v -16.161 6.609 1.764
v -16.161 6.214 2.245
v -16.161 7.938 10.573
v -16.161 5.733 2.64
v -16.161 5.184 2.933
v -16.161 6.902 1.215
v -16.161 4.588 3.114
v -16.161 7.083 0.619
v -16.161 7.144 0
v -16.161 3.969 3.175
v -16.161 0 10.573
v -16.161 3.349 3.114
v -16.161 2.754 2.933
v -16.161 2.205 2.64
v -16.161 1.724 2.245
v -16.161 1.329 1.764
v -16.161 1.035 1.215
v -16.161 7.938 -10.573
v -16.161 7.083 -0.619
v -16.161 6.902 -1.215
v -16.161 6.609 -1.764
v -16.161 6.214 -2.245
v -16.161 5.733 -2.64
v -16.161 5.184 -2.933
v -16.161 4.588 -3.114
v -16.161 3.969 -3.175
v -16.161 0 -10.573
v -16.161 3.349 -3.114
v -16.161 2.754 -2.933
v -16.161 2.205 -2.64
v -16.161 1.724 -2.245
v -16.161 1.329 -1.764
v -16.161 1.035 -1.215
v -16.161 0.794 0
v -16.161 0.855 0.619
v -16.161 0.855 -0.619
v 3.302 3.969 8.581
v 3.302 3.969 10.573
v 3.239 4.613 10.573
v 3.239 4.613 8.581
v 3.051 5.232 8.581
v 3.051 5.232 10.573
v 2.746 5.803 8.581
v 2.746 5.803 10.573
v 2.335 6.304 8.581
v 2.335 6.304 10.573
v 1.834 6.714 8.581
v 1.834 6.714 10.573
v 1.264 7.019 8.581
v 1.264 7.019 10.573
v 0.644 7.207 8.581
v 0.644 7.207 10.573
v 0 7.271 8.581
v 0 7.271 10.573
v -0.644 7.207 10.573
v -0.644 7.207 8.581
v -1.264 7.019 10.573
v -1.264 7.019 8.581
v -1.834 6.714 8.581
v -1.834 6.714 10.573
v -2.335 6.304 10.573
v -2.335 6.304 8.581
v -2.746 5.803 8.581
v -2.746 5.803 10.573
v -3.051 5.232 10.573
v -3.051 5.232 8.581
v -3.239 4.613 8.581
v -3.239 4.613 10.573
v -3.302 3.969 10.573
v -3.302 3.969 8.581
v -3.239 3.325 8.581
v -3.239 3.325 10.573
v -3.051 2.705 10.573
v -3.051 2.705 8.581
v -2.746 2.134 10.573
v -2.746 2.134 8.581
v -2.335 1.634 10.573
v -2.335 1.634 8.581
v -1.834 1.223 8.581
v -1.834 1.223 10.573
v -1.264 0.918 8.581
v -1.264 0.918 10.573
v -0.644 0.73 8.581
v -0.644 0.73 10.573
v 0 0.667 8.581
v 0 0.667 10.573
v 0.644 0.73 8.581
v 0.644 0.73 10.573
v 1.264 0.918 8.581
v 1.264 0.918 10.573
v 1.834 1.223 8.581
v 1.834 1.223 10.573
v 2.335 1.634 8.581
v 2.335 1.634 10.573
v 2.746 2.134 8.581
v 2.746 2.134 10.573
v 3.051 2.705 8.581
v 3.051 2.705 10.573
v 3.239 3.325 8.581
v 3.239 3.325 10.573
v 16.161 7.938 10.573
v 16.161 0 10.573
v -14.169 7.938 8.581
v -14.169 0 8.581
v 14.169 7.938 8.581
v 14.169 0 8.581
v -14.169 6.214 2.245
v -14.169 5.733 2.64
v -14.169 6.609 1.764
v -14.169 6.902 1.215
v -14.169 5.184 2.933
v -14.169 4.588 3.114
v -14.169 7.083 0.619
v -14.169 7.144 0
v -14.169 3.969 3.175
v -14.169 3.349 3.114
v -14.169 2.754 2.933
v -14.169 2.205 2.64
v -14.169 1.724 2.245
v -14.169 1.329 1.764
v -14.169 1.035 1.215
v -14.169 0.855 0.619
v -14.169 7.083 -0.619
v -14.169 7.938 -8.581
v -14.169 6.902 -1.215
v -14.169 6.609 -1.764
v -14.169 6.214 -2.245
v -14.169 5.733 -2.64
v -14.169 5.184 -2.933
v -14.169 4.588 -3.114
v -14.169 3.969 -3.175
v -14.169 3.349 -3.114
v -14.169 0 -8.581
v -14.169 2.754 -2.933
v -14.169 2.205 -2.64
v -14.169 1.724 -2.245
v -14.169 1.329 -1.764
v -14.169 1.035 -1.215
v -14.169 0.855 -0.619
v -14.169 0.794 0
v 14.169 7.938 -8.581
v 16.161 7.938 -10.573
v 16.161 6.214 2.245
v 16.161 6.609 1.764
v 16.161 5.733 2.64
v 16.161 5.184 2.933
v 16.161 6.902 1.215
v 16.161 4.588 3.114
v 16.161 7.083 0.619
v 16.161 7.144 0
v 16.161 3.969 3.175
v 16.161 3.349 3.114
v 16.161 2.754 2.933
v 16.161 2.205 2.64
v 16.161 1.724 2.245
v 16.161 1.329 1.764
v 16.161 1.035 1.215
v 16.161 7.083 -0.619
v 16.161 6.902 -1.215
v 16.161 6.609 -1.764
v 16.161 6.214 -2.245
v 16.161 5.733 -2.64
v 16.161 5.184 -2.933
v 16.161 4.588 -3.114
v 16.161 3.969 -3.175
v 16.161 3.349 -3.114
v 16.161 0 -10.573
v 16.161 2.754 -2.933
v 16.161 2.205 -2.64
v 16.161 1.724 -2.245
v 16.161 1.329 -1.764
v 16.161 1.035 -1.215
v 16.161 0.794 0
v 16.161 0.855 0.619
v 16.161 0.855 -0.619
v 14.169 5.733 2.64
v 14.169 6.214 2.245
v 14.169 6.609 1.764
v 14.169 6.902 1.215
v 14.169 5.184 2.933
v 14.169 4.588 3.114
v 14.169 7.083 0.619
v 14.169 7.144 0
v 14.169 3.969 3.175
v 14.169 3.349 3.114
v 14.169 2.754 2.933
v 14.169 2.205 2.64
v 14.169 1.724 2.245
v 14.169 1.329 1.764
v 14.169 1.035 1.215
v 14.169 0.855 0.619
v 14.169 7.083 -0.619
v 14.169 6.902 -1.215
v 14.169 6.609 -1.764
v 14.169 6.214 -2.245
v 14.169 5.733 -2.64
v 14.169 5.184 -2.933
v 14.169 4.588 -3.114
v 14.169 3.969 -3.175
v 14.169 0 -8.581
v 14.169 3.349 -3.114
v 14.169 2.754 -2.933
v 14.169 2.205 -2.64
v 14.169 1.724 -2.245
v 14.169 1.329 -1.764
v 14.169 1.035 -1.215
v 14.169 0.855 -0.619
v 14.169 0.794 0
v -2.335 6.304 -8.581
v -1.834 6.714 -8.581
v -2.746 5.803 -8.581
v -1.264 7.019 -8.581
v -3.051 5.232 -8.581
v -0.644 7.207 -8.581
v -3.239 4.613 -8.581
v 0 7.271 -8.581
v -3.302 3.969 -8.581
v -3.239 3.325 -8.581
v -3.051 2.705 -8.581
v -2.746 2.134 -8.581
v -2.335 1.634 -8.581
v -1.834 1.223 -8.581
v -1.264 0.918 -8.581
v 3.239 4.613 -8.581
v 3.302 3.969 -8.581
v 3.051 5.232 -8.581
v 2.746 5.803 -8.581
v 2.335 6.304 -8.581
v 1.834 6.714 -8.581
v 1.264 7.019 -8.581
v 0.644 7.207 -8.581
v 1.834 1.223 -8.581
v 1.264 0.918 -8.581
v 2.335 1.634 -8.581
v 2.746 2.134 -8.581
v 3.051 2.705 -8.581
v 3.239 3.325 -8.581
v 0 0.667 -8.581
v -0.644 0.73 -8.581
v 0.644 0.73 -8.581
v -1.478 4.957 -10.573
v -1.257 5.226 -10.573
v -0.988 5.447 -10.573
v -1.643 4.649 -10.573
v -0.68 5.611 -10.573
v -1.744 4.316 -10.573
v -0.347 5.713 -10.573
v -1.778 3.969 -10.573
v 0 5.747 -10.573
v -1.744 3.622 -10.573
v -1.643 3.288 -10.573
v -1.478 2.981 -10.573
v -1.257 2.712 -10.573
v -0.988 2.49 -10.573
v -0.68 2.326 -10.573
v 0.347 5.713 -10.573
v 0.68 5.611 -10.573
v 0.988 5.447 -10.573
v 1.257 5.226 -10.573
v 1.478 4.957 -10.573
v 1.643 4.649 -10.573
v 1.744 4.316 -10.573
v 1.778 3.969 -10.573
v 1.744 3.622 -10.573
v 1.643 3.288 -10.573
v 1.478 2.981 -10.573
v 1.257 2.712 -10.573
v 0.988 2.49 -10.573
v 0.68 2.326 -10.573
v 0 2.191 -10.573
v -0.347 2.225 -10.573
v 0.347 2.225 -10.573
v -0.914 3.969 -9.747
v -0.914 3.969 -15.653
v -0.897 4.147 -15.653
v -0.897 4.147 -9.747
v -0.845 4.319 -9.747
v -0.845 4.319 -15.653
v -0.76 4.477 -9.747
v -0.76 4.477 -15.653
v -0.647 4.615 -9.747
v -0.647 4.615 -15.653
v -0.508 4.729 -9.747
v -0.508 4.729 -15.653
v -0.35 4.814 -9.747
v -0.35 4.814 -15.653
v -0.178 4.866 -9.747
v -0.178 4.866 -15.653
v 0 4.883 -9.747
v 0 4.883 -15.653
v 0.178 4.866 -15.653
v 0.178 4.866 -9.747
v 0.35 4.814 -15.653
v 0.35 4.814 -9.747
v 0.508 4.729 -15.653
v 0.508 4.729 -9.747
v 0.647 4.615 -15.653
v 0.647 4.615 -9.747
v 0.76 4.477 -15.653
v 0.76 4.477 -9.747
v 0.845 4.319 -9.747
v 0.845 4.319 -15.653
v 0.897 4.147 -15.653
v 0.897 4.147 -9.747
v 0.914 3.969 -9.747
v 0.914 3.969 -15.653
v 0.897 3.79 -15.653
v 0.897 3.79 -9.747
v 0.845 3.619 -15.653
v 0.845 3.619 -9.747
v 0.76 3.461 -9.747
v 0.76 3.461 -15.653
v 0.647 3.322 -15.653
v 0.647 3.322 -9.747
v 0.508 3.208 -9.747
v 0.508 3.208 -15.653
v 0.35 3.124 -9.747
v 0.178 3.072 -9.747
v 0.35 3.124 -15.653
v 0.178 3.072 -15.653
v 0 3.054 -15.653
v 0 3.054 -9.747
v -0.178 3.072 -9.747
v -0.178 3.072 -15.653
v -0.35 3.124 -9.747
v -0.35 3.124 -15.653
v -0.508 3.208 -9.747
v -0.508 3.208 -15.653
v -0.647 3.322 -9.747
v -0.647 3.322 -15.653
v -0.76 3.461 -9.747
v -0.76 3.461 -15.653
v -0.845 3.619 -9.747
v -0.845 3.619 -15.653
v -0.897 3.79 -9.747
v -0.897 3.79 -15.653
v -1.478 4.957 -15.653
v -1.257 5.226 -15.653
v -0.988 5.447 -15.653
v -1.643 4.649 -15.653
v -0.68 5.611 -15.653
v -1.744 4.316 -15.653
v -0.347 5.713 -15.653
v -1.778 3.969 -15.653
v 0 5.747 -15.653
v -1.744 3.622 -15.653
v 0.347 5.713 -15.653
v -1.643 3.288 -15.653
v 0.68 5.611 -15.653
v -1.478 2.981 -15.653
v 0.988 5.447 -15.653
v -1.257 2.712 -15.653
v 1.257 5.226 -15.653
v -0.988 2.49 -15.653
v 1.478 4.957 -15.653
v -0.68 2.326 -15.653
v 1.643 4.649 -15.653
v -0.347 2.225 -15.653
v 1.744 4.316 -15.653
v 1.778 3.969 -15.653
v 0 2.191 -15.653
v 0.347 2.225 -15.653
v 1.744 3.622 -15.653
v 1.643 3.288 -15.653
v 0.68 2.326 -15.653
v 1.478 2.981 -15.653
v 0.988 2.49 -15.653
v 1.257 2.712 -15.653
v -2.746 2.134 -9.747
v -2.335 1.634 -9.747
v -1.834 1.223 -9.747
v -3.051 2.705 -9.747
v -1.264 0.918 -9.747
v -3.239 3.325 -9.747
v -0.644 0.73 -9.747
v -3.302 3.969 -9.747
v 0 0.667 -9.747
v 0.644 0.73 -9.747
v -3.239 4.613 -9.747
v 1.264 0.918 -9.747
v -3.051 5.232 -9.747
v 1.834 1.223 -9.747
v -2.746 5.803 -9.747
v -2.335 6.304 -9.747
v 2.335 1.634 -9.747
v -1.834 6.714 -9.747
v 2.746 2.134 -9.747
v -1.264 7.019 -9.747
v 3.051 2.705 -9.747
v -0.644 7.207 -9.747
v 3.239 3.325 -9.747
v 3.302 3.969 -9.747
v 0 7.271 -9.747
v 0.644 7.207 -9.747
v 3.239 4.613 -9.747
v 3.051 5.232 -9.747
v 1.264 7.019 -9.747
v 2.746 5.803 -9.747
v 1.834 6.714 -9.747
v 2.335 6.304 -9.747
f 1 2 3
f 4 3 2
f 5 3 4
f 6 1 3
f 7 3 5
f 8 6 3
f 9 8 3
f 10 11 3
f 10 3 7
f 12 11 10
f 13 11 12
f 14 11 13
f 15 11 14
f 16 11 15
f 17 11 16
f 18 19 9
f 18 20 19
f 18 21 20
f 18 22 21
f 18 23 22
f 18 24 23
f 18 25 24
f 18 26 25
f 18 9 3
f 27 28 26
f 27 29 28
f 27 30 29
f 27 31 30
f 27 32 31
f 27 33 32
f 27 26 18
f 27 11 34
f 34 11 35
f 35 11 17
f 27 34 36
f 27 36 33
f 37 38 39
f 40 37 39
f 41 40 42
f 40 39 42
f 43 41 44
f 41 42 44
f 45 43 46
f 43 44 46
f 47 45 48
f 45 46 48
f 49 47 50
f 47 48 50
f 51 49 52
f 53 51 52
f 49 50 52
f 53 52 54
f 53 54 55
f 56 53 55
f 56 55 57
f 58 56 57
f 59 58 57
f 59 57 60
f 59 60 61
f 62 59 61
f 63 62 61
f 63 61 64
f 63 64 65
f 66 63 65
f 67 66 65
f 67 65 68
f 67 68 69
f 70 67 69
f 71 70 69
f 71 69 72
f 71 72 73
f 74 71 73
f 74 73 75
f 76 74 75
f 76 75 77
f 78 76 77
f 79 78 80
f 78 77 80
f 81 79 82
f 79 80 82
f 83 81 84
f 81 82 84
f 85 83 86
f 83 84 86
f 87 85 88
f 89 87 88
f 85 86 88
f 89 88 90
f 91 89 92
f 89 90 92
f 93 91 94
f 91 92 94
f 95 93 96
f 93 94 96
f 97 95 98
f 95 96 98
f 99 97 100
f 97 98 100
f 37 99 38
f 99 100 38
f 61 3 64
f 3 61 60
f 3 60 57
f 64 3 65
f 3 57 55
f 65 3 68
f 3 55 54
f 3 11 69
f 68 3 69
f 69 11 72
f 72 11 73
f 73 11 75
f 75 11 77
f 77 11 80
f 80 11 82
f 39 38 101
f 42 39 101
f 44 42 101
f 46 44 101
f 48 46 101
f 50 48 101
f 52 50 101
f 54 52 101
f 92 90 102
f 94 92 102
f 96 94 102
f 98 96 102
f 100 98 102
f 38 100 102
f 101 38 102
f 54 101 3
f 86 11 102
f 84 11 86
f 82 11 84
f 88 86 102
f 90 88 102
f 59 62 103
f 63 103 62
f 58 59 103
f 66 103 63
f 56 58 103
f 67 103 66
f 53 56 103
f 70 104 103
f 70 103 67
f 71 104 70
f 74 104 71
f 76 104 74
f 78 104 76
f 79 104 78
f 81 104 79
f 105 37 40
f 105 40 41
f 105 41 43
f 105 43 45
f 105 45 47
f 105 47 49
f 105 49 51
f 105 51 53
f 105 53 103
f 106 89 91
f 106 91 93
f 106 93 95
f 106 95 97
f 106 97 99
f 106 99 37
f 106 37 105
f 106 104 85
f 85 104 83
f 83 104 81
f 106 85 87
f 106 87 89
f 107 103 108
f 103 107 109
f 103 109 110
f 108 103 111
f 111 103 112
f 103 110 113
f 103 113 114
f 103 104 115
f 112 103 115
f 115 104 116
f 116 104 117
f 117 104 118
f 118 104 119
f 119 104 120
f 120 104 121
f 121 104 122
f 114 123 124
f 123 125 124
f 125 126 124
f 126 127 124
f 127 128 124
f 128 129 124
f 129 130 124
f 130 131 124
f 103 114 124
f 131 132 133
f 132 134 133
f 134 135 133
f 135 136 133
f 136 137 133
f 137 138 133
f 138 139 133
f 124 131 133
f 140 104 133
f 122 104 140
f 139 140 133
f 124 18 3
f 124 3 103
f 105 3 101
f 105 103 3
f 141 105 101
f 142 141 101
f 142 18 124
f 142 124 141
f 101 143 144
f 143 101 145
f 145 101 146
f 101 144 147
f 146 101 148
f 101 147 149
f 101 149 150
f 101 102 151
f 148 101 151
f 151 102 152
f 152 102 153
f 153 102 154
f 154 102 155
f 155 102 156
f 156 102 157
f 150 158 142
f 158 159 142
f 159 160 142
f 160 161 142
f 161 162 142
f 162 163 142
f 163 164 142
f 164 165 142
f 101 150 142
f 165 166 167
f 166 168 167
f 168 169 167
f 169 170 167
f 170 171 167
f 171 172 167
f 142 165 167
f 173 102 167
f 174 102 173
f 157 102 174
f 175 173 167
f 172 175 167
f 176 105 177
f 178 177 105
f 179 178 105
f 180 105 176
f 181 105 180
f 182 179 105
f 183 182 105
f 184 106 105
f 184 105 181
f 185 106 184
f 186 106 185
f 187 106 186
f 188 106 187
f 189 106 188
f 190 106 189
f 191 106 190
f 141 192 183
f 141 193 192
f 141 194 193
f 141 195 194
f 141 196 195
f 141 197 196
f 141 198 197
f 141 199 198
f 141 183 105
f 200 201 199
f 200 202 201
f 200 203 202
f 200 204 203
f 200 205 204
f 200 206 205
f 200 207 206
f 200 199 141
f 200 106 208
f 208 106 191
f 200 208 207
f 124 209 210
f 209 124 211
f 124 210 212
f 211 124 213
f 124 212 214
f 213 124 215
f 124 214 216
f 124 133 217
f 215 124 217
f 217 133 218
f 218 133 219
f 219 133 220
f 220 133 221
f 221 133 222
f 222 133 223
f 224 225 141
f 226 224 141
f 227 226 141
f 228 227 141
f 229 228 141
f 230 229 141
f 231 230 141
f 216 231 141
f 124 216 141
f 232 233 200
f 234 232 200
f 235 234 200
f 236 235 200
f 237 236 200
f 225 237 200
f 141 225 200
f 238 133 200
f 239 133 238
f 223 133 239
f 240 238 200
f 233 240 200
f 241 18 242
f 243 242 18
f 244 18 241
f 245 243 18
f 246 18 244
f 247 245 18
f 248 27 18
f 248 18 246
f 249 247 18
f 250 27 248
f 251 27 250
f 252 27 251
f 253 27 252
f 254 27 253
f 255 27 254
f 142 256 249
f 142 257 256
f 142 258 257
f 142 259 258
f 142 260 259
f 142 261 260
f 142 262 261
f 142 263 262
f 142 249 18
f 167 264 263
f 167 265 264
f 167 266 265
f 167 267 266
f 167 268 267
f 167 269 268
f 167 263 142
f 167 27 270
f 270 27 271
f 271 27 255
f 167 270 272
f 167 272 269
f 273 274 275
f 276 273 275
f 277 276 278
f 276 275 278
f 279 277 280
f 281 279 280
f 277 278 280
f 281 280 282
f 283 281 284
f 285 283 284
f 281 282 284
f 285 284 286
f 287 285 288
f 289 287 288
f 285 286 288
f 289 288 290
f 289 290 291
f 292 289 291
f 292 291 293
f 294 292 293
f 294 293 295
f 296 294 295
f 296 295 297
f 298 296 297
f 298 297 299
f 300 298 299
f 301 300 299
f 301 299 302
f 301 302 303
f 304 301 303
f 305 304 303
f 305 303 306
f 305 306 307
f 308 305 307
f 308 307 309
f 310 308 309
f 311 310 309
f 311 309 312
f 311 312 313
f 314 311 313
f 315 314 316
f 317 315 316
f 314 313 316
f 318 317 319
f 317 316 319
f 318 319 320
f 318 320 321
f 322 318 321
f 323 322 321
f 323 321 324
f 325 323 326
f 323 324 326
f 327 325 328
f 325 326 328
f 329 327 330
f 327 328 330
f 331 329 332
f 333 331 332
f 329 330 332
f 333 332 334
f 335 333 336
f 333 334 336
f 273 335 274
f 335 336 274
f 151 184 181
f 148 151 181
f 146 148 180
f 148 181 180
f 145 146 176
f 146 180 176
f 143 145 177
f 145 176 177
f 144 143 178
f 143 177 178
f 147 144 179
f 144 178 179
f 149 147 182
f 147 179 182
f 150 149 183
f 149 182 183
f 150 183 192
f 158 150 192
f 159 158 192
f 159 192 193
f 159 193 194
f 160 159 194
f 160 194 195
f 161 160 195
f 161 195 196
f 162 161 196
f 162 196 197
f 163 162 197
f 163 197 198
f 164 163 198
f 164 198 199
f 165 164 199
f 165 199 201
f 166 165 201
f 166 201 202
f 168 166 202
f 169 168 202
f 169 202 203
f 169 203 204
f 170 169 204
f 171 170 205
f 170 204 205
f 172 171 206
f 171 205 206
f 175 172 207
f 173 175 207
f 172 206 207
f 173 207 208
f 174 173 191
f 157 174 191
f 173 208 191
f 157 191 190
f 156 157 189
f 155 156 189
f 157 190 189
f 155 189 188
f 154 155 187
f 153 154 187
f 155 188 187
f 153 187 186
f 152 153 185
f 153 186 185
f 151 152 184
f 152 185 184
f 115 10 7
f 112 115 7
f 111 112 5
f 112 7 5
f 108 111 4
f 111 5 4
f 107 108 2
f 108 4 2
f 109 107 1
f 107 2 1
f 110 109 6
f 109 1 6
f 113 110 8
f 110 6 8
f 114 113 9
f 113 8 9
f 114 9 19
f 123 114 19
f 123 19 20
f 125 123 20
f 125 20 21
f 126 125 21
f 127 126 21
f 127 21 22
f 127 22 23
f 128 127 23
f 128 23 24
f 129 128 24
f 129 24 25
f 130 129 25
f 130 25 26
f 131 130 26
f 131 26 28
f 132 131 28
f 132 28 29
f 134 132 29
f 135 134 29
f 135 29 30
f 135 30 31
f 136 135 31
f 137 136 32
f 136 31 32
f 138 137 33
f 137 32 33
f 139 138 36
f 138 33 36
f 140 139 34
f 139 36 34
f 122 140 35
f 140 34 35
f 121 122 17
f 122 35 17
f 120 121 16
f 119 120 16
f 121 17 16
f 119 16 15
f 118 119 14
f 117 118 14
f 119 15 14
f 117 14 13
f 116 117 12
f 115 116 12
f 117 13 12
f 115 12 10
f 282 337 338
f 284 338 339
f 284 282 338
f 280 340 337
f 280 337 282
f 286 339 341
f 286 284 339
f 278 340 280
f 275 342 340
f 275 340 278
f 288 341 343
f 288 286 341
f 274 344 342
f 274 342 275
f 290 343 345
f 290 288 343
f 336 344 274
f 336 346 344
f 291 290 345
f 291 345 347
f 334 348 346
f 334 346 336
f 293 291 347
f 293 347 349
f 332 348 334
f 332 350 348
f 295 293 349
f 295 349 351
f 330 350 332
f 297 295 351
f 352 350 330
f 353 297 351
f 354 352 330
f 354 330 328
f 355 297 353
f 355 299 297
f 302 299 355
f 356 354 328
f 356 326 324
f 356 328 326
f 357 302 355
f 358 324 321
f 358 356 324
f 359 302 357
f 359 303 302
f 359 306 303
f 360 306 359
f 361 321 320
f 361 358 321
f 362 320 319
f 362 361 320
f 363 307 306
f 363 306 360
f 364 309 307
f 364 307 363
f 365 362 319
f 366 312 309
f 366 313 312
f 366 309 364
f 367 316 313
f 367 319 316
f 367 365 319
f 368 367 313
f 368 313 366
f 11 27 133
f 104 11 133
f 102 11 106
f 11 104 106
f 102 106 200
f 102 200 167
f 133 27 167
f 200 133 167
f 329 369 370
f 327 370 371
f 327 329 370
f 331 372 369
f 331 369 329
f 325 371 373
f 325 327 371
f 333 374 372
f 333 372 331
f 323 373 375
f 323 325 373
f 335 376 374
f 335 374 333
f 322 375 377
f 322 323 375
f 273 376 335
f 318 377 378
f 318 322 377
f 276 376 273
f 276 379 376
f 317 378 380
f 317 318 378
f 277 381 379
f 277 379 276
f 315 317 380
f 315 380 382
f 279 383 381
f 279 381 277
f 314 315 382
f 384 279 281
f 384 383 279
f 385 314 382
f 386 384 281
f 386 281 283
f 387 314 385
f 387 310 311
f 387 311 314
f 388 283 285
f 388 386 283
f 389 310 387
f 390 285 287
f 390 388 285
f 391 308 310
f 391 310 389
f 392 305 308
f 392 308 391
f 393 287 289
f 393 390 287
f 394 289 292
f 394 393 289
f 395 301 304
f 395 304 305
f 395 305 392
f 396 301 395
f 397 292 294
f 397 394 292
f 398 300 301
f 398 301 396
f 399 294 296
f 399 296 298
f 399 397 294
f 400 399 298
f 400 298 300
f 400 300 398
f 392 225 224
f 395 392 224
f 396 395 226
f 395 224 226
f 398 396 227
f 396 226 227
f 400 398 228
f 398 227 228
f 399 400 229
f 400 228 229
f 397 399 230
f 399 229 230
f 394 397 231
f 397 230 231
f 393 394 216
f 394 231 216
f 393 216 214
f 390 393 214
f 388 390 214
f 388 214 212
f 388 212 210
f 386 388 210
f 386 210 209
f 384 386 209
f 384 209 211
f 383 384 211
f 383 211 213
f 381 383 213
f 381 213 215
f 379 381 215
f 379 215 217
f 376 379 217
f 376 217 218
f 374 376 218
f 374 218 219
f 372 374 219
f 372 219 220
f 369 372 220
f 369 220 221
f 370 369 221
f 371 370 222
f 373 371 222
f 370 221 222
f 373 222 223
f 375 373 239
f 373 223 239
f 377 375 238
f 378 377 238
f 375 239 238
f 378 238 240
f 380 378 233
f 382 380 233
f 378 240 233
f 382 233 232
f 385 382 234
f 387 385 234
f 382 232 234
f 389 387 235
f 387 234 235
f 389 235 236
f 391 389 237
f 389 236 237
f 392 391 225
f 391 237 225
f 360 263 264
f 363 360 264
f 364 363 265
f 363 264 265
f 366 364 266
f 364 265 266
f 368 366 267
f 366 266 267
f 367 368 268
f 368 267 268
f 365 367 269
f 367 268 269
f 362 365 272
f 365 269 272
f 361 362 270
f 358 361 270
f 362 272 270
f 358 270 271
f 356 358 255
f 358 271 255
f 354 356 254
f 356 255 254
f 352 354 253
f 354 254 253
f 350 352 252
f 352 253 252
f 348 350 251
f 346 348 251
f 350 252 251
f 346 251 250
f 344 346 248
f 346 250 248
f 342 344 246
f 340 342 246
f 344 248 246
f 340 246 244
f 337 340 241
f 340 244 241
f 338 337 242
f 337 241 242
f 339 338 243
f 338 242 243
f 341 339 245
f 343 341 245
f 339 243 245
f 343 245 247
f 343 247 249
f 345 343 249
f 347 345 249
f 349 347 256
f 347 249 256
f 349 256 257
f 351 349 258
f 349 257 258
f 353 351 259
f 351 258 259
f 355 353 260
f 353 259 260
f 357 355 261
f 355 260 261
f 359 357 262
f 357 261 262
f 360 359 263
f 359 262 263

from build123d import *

# Parameters (mm, degrees)
SKETCH1_W           = 32.3215
SKETCH1_H           = 21.1455
SKETCH1_W_2         = 28.33878
SKETCH1_H_2         = 17.16278
BOSS_EXTRUDE1_DEPTH = 7.9375
SKETCH2_R           = 3.175
CUT_EXTRUDE1_DEPTH  = 37.1475
SKETCH3_R           = 3.302
CUT_EXTRUDE2_DEPTH  = 20.32
SKETCH4_R           = 1.778
BOSS_EXTRUDE3_DEPTH = 5.08
SKETCH6_R           = 0.9144
CUT_EXTRUDE3_DEPTH  = 10.922


with BuildPart() as part:
    # Sketch1 → Boss-Extrude1 (new body)
    with BuildSketch(Plane(origin=(0, 0, 0), x_dir=(1, 0, 0), z_dir=(0, 1, 0))):
        Rectangle(SKETCH1_W, SKETCH1_H)
        Rectangle(SKETCH1_W_2, SKETCH1_H_2, mode=Mode.SUBTRACT)
    extrude(amount=BOSS_EXTRUDE1_DEPTH)

    # Sketch2 → Cut-Extrude1 (cut)
    with BuildSketch(Plane.ZY.offset(16.16075)):
        with Locations((0, 3.96875)):
            Circle(SKETCH2_R)
    extrude(amount=-CUT_EXTRUDE1_DEPTH, mode=Mode.SUBTRACT)

    # Sketch3 → Cut-Extrude2 (cut)
    with BuildSketch(Plane.XY.offset(10.57275)):
        with Locations((0, 3.96875)):
            Circle(SKETCH3_R)
    extrude(amount=-CUT_EXTRUDE2_DEPTH, mode=Mode.SUBTRACT)

    # Sketch4 → Boss-Extrude3 (add)
    with BuildSketch(Plane(origin=(0, 0, -10.57275), x_dir=(-1, 0, 0), z_dir=(0, 0, -1))):
        with Locations(Location((0, 3.96875, 0), (0, 0, 180))):
            Circle(SKETCH4_R)
    extrude(amount=BOSS_EXTRUDE3_DEPTH)

    # Sketch6 → Cut-Extrude3 (cut)
    with BuildSketch(Plane(origin=(0, 0, -15.65275), x_dir=(-1, 0, 0), z_dir=(0, 0, -1))):
        with Locations((0, 3.96875)):
            Circle(SKETCH6_R)
    extrude(amount=-CUT_EXTRUDE3_DEPTH, mode=Mode.SUBTRACT)


solid = part.part
